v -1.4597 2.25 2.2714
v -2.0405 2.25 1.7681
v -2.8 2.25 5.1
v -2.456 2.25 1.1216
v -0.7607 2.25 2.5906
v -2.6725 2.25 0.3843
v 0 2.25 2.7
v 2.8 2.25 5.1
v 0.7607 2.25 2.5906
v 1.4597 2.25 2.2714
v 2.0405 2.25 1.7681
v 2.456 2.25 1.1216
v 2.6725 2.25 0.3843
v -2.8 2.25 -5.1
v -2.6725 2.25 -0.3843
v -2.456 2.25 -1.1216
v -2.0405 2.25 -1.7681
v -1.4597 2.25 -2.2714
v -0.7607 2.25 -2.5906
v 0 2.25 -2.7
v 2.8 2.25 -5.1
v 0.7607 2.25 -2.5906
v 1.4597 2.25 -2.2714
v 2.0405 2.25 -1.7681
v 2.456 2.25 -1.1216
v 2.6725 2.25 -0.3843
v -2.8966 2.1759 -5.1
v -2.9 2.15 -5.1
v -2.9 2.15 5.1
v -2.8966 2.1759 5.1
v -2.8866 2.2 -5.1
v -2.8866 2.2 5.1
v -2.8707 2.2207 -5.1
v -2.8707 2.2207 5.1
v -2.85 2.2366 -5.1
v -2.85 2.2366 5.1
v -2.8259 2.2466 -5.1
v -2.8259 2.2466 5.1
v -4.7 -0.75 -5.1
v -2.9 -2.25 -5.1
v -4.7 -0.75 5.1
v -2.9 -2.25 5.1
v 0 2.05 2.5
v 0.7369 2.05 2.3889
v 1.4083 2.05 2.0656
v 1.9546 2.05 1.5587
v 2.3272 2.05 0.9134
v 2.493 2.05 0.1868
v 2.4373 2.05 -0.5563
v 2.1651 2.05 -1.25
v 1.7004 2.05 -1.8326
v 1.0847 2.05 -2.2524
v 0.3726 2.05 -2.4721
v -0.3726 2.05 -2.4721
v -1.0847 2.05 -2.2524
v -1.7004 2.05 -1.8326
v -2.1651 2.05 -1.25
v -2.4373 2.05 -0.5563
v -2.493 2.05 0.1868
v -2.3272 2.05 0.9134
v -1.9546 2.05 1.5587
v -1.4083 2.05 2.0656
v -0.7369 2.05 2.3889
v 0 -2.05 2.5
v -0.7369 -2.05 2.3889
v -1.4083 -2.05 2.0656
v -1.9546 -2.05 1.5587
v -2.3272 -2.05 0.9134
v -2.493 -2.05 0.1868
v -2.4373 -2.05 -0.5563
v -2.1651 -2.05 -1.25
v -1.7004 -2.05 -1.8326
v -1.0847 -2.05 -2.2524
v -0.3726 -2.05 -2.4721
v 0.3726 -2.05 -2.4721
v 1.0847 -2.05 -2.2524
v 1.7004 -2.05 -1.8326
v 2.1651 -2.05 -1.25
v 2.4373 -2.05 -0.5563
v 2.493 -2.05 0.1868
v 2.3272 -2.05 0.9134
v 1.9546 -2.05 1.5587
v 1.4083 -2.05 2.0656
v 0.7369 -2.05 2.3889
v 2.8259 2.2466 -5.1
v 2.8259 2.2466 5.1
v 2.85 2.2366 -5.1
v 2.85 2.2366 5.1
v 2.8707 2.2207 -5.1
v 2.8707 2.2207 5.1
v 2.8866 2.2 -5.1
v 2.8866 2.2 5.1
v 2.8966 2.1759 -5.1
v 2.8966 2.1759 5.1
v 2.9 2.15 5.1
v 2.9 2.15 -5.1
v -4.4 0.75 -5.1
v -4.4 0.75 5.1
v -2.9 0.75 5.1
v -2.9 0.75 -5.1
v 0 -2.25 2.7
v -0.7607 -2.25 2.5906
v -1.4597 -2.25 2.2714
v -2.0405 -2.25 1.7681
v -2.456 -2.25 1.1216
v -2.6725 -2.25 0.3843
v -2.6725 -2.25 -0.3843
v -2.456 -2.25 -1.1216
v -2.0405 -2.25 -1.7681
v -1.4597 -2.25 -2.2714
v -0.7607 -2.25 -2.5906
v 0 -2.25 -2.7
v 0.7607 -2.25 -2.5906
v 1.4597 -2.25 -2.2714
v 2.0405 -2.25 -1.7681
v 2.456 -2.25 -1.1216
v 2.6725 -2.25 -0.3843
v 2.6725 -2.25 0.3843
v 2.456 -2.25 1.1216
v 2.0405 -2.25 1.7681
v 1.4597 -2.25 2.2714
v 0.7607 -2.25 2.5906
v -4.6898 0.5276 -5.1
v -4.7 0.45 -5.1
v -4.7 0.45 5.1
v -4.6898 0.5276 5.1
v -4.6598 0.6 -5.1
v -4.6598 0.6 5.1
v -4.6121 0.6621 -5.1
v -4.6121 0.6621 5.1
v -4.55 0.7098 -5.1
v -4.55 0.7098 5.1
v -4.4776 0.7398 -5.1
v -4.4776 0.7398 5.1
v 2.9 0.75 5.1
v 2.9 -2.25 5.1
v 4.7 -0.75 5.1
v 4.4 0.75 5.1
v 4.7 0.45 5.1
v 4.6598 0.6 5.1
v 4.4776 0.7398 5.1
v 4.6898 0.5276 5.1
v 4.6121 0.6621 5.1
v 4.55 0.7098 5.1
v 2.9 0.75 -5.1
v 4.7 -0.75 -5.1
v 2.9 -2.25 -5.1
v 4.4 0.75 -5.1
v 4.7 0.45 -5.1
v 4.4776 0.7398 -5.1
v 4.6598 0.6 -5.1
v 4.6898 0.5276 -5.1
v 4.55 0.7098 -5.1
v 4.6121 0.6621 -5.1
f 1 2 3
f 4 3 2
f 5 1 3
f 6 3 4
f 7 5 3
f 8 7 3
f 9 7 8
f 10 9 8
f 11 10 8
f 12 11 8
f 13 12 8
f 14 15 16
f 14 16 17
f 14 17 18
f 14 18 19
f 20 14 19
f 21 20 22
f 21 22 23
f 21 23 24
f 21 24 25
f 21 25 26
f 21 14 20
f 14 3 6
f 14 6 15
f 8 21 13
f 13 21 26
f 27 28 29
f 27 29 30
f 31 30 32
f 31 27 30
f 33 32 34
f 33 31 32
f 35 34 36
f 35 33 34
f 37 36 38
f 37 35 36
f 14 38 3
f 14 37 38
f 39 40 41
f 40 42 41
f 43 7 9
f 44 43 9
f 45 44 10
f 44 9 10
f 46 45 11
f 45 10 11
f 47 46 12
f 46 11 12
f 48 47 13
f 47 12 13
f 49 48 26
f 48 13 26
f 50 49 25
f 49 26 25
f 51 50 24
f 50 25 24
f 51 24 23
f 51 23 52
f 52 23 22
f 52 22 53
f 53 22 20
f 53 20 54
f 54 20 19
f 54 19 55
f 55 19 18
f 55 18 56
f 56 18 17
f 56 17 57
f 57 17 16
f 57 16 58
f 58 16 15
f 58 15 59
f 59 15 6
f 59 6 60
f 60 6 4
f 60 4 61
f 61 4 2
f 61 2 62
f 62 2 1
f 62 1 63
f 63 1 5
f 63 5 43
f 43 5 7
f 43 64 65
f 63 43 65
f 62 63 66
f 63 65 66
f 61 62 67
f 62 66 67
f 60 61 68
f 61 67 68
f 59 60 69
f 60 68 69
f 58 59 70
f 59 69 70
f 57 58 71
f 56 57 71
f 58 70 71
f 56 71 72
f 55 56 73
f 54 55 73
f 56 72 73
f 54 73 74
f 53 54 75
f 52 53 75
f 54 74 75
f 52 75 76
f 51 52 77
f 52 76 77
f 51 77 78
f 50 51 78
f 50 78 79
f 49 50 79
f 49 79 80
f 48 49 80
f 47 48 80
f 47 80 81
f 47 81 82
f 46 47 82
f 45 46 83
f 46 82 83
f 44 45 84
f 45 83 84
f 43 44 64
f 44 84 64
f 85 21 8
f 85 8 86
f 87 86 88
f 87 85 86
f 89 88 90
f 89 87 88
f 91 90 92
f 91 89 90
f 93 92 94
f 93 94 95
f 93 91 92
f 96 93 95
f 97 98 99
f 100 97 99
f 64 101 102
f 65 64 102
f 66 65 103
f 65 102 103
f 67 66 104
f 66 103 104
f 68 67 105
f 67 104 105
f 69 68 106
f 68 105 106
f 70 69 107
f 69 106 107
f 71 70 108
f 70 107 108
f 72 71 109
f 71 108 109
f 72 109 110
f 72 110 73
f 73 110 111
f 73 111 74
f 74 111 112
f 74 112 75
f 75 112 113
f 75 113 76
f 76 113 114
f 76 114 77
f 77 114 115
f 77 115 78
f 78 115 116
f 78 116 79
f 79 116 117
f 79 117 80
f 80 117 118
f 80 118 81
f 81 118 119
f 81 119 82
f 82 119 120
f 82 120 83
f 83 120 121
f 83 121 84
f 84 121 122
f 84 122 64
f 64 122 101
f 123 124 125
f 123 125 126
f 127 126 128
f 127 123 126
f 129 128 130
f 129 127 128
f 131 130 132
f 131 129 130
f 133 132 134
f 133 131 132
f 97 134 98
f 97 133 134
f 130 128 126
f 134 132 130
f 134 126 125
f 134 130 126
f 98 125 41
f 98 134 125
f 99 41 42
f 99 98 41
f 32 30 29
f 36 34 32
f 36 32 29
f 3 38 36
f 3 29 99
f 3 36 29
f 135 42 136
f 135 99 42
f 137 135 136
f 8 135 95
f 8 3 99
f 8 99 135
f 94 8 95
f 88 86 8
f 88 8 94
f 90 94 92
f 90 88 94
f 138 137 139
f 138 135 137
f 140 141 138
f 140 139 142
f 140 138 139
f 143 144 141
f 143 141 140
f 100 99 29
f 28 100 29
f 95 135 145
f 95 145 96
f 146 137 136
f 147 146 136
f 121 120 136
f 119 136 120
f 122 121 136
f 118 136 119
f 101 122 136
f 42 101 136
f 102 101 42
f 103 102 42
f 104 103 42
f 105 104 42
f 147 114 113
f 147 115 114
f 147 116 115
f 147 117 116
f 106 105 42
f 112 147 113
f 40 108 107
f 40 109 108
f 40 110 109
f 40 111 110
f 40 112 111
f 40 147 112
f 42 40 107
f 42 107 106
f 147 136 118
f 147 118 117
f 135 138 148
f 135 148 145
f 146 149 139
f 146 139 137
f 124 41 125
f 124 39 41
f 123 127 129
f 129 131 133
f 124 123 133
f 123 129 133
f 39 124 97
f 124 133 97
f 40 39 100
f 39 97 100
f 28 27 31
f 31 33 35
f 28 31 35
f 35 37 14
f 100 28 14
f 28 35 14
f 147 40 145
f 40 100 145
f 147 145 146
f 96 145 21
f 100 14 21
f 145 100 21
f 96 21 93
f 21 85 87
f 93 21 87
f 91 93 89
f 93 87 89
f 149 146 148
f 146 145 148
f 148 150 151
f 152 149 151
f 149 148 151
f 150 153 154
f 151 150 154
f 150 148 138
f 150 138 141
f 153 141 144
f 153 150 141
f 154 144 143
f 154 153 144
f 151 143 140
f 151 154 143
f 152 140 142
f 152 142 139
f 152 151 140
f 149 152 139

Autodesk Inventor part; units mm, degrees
ref_plane "YZ Plane" through (0, 0, 0) normal (1, 0, 0) x (0, 1, 0)
ref_plane "XZ Plane" through (0, 0, 0) normal (0, 1, 0) x (-1, 0, 0)
ref_plane "XY Plane" through (0, 0, 0) normal (0, 0, 1) x (1, 0, 0)
sketch "Эскиз1" plane through (0, 0, 0) normal (0, 0, 1) x (1, 0, 0)
  line L0 (-4.7, 2.25) -> (4.7, 2.25)
  line L1 (4.7, 2.25) -> (4.7, -2.25)
  line L2 (4.7, -2.25) -> (-4.7, -2.25)
  line L3 (-4.7, -2.25) -> (-4.7, 2.25)
  point P0 (0, 0)
  point P1 (-4.7, 0)
  point P2 (0, 2.25)
  dimension "d0" = 9.4
  dimension "d1" = 4.5
extrude "Выдавливание1" add sketch "Эскиз1" along normal mid plane 10.2
sketch "Эскиз3" plane through (0, 0, 5.1) normal (0, 0, 1) x (1, 0, 0)
  line L0 (-4.7, 2.25) -> (-4.7, -2.25) projected
  line L1 (-4.7, 0.75) -> (-2.9, 0.75)
  line L2 (-2.9, 0.75) -> (-2.9, 2.25)
  line L3 (4.7, 2.25) -> (-4.7, 2.25) projected
  line L4 (4.7, -2.25) -> (4.7, 2.25) projected
  line L5 (4.7, 0.75) -> (2.9, 0.75)
  line L6 (2.9, 0.75) -> (2.9, 2.25)
  point P0 (0, 0)
  dimension "d7" = 1.5
  dimension "d8" = 2.9
  dimension "d9" = 5.8
extrude "Выдавливание2" cut sketch "Эскиз3" against normal blind 10.2
sketch "Эскиз5" plane through (0, 0, 5.1) normal (0, 0, 1) x (1, 0, 0)
  line L0 (-4.7, -2.25) -> (4.7, -2.25) projected
  line L1 (-2.9, -2.25) -> (-4.7, -0.75)
  line L2 (-4.7, 0.75) -> (-4.7, -2.25) projected
  line L3 (4.7, -2.25) -> (4.7, 0.75) projected
  line L4 (4.7, -0.75) -> (2.9, -2.25)
  point P0 (0, 0)
  dimension "d15" = 1.5
  dimension "d16" = 2.9
  dimension "d17" = 5.8
extrude "Выдавливание3" cut sketch "Эскиз5" against normal blind 10.2
sketch "Эскиз6" plane through (-2.9, 2.25, -5.1) normal (0, 1, 0) x (1, 0, 0)
  point P0 (2.9, -5.1)
  point P1 (2.9, -5.1)
hole "Отверстие1" at (0, 2.25, 0) direction (0, -1, 0) diameter 5 end through all
thread "Резьба1" size "M5x0.5" class "6H" standard "ANSI Metric M Profile" full length
chamfer "Фаска1" distance 0.2 angle 45 2 edges at (0, 2.25, -2.5) (0, -2.25, -2.5)
fillet "Сопряжение2" radius 0.1 2 edges at (2.9, 2.25, 0) (-2.9, 2.25, 0)
fillet "Сопряжение3" radius 0.3 2 edges at (-4.7, 0.75, 0) (4.7, 0.75, 0)
properties part number "COTS_GENERIC_20x20_M5_Nut" material "Сталь"
